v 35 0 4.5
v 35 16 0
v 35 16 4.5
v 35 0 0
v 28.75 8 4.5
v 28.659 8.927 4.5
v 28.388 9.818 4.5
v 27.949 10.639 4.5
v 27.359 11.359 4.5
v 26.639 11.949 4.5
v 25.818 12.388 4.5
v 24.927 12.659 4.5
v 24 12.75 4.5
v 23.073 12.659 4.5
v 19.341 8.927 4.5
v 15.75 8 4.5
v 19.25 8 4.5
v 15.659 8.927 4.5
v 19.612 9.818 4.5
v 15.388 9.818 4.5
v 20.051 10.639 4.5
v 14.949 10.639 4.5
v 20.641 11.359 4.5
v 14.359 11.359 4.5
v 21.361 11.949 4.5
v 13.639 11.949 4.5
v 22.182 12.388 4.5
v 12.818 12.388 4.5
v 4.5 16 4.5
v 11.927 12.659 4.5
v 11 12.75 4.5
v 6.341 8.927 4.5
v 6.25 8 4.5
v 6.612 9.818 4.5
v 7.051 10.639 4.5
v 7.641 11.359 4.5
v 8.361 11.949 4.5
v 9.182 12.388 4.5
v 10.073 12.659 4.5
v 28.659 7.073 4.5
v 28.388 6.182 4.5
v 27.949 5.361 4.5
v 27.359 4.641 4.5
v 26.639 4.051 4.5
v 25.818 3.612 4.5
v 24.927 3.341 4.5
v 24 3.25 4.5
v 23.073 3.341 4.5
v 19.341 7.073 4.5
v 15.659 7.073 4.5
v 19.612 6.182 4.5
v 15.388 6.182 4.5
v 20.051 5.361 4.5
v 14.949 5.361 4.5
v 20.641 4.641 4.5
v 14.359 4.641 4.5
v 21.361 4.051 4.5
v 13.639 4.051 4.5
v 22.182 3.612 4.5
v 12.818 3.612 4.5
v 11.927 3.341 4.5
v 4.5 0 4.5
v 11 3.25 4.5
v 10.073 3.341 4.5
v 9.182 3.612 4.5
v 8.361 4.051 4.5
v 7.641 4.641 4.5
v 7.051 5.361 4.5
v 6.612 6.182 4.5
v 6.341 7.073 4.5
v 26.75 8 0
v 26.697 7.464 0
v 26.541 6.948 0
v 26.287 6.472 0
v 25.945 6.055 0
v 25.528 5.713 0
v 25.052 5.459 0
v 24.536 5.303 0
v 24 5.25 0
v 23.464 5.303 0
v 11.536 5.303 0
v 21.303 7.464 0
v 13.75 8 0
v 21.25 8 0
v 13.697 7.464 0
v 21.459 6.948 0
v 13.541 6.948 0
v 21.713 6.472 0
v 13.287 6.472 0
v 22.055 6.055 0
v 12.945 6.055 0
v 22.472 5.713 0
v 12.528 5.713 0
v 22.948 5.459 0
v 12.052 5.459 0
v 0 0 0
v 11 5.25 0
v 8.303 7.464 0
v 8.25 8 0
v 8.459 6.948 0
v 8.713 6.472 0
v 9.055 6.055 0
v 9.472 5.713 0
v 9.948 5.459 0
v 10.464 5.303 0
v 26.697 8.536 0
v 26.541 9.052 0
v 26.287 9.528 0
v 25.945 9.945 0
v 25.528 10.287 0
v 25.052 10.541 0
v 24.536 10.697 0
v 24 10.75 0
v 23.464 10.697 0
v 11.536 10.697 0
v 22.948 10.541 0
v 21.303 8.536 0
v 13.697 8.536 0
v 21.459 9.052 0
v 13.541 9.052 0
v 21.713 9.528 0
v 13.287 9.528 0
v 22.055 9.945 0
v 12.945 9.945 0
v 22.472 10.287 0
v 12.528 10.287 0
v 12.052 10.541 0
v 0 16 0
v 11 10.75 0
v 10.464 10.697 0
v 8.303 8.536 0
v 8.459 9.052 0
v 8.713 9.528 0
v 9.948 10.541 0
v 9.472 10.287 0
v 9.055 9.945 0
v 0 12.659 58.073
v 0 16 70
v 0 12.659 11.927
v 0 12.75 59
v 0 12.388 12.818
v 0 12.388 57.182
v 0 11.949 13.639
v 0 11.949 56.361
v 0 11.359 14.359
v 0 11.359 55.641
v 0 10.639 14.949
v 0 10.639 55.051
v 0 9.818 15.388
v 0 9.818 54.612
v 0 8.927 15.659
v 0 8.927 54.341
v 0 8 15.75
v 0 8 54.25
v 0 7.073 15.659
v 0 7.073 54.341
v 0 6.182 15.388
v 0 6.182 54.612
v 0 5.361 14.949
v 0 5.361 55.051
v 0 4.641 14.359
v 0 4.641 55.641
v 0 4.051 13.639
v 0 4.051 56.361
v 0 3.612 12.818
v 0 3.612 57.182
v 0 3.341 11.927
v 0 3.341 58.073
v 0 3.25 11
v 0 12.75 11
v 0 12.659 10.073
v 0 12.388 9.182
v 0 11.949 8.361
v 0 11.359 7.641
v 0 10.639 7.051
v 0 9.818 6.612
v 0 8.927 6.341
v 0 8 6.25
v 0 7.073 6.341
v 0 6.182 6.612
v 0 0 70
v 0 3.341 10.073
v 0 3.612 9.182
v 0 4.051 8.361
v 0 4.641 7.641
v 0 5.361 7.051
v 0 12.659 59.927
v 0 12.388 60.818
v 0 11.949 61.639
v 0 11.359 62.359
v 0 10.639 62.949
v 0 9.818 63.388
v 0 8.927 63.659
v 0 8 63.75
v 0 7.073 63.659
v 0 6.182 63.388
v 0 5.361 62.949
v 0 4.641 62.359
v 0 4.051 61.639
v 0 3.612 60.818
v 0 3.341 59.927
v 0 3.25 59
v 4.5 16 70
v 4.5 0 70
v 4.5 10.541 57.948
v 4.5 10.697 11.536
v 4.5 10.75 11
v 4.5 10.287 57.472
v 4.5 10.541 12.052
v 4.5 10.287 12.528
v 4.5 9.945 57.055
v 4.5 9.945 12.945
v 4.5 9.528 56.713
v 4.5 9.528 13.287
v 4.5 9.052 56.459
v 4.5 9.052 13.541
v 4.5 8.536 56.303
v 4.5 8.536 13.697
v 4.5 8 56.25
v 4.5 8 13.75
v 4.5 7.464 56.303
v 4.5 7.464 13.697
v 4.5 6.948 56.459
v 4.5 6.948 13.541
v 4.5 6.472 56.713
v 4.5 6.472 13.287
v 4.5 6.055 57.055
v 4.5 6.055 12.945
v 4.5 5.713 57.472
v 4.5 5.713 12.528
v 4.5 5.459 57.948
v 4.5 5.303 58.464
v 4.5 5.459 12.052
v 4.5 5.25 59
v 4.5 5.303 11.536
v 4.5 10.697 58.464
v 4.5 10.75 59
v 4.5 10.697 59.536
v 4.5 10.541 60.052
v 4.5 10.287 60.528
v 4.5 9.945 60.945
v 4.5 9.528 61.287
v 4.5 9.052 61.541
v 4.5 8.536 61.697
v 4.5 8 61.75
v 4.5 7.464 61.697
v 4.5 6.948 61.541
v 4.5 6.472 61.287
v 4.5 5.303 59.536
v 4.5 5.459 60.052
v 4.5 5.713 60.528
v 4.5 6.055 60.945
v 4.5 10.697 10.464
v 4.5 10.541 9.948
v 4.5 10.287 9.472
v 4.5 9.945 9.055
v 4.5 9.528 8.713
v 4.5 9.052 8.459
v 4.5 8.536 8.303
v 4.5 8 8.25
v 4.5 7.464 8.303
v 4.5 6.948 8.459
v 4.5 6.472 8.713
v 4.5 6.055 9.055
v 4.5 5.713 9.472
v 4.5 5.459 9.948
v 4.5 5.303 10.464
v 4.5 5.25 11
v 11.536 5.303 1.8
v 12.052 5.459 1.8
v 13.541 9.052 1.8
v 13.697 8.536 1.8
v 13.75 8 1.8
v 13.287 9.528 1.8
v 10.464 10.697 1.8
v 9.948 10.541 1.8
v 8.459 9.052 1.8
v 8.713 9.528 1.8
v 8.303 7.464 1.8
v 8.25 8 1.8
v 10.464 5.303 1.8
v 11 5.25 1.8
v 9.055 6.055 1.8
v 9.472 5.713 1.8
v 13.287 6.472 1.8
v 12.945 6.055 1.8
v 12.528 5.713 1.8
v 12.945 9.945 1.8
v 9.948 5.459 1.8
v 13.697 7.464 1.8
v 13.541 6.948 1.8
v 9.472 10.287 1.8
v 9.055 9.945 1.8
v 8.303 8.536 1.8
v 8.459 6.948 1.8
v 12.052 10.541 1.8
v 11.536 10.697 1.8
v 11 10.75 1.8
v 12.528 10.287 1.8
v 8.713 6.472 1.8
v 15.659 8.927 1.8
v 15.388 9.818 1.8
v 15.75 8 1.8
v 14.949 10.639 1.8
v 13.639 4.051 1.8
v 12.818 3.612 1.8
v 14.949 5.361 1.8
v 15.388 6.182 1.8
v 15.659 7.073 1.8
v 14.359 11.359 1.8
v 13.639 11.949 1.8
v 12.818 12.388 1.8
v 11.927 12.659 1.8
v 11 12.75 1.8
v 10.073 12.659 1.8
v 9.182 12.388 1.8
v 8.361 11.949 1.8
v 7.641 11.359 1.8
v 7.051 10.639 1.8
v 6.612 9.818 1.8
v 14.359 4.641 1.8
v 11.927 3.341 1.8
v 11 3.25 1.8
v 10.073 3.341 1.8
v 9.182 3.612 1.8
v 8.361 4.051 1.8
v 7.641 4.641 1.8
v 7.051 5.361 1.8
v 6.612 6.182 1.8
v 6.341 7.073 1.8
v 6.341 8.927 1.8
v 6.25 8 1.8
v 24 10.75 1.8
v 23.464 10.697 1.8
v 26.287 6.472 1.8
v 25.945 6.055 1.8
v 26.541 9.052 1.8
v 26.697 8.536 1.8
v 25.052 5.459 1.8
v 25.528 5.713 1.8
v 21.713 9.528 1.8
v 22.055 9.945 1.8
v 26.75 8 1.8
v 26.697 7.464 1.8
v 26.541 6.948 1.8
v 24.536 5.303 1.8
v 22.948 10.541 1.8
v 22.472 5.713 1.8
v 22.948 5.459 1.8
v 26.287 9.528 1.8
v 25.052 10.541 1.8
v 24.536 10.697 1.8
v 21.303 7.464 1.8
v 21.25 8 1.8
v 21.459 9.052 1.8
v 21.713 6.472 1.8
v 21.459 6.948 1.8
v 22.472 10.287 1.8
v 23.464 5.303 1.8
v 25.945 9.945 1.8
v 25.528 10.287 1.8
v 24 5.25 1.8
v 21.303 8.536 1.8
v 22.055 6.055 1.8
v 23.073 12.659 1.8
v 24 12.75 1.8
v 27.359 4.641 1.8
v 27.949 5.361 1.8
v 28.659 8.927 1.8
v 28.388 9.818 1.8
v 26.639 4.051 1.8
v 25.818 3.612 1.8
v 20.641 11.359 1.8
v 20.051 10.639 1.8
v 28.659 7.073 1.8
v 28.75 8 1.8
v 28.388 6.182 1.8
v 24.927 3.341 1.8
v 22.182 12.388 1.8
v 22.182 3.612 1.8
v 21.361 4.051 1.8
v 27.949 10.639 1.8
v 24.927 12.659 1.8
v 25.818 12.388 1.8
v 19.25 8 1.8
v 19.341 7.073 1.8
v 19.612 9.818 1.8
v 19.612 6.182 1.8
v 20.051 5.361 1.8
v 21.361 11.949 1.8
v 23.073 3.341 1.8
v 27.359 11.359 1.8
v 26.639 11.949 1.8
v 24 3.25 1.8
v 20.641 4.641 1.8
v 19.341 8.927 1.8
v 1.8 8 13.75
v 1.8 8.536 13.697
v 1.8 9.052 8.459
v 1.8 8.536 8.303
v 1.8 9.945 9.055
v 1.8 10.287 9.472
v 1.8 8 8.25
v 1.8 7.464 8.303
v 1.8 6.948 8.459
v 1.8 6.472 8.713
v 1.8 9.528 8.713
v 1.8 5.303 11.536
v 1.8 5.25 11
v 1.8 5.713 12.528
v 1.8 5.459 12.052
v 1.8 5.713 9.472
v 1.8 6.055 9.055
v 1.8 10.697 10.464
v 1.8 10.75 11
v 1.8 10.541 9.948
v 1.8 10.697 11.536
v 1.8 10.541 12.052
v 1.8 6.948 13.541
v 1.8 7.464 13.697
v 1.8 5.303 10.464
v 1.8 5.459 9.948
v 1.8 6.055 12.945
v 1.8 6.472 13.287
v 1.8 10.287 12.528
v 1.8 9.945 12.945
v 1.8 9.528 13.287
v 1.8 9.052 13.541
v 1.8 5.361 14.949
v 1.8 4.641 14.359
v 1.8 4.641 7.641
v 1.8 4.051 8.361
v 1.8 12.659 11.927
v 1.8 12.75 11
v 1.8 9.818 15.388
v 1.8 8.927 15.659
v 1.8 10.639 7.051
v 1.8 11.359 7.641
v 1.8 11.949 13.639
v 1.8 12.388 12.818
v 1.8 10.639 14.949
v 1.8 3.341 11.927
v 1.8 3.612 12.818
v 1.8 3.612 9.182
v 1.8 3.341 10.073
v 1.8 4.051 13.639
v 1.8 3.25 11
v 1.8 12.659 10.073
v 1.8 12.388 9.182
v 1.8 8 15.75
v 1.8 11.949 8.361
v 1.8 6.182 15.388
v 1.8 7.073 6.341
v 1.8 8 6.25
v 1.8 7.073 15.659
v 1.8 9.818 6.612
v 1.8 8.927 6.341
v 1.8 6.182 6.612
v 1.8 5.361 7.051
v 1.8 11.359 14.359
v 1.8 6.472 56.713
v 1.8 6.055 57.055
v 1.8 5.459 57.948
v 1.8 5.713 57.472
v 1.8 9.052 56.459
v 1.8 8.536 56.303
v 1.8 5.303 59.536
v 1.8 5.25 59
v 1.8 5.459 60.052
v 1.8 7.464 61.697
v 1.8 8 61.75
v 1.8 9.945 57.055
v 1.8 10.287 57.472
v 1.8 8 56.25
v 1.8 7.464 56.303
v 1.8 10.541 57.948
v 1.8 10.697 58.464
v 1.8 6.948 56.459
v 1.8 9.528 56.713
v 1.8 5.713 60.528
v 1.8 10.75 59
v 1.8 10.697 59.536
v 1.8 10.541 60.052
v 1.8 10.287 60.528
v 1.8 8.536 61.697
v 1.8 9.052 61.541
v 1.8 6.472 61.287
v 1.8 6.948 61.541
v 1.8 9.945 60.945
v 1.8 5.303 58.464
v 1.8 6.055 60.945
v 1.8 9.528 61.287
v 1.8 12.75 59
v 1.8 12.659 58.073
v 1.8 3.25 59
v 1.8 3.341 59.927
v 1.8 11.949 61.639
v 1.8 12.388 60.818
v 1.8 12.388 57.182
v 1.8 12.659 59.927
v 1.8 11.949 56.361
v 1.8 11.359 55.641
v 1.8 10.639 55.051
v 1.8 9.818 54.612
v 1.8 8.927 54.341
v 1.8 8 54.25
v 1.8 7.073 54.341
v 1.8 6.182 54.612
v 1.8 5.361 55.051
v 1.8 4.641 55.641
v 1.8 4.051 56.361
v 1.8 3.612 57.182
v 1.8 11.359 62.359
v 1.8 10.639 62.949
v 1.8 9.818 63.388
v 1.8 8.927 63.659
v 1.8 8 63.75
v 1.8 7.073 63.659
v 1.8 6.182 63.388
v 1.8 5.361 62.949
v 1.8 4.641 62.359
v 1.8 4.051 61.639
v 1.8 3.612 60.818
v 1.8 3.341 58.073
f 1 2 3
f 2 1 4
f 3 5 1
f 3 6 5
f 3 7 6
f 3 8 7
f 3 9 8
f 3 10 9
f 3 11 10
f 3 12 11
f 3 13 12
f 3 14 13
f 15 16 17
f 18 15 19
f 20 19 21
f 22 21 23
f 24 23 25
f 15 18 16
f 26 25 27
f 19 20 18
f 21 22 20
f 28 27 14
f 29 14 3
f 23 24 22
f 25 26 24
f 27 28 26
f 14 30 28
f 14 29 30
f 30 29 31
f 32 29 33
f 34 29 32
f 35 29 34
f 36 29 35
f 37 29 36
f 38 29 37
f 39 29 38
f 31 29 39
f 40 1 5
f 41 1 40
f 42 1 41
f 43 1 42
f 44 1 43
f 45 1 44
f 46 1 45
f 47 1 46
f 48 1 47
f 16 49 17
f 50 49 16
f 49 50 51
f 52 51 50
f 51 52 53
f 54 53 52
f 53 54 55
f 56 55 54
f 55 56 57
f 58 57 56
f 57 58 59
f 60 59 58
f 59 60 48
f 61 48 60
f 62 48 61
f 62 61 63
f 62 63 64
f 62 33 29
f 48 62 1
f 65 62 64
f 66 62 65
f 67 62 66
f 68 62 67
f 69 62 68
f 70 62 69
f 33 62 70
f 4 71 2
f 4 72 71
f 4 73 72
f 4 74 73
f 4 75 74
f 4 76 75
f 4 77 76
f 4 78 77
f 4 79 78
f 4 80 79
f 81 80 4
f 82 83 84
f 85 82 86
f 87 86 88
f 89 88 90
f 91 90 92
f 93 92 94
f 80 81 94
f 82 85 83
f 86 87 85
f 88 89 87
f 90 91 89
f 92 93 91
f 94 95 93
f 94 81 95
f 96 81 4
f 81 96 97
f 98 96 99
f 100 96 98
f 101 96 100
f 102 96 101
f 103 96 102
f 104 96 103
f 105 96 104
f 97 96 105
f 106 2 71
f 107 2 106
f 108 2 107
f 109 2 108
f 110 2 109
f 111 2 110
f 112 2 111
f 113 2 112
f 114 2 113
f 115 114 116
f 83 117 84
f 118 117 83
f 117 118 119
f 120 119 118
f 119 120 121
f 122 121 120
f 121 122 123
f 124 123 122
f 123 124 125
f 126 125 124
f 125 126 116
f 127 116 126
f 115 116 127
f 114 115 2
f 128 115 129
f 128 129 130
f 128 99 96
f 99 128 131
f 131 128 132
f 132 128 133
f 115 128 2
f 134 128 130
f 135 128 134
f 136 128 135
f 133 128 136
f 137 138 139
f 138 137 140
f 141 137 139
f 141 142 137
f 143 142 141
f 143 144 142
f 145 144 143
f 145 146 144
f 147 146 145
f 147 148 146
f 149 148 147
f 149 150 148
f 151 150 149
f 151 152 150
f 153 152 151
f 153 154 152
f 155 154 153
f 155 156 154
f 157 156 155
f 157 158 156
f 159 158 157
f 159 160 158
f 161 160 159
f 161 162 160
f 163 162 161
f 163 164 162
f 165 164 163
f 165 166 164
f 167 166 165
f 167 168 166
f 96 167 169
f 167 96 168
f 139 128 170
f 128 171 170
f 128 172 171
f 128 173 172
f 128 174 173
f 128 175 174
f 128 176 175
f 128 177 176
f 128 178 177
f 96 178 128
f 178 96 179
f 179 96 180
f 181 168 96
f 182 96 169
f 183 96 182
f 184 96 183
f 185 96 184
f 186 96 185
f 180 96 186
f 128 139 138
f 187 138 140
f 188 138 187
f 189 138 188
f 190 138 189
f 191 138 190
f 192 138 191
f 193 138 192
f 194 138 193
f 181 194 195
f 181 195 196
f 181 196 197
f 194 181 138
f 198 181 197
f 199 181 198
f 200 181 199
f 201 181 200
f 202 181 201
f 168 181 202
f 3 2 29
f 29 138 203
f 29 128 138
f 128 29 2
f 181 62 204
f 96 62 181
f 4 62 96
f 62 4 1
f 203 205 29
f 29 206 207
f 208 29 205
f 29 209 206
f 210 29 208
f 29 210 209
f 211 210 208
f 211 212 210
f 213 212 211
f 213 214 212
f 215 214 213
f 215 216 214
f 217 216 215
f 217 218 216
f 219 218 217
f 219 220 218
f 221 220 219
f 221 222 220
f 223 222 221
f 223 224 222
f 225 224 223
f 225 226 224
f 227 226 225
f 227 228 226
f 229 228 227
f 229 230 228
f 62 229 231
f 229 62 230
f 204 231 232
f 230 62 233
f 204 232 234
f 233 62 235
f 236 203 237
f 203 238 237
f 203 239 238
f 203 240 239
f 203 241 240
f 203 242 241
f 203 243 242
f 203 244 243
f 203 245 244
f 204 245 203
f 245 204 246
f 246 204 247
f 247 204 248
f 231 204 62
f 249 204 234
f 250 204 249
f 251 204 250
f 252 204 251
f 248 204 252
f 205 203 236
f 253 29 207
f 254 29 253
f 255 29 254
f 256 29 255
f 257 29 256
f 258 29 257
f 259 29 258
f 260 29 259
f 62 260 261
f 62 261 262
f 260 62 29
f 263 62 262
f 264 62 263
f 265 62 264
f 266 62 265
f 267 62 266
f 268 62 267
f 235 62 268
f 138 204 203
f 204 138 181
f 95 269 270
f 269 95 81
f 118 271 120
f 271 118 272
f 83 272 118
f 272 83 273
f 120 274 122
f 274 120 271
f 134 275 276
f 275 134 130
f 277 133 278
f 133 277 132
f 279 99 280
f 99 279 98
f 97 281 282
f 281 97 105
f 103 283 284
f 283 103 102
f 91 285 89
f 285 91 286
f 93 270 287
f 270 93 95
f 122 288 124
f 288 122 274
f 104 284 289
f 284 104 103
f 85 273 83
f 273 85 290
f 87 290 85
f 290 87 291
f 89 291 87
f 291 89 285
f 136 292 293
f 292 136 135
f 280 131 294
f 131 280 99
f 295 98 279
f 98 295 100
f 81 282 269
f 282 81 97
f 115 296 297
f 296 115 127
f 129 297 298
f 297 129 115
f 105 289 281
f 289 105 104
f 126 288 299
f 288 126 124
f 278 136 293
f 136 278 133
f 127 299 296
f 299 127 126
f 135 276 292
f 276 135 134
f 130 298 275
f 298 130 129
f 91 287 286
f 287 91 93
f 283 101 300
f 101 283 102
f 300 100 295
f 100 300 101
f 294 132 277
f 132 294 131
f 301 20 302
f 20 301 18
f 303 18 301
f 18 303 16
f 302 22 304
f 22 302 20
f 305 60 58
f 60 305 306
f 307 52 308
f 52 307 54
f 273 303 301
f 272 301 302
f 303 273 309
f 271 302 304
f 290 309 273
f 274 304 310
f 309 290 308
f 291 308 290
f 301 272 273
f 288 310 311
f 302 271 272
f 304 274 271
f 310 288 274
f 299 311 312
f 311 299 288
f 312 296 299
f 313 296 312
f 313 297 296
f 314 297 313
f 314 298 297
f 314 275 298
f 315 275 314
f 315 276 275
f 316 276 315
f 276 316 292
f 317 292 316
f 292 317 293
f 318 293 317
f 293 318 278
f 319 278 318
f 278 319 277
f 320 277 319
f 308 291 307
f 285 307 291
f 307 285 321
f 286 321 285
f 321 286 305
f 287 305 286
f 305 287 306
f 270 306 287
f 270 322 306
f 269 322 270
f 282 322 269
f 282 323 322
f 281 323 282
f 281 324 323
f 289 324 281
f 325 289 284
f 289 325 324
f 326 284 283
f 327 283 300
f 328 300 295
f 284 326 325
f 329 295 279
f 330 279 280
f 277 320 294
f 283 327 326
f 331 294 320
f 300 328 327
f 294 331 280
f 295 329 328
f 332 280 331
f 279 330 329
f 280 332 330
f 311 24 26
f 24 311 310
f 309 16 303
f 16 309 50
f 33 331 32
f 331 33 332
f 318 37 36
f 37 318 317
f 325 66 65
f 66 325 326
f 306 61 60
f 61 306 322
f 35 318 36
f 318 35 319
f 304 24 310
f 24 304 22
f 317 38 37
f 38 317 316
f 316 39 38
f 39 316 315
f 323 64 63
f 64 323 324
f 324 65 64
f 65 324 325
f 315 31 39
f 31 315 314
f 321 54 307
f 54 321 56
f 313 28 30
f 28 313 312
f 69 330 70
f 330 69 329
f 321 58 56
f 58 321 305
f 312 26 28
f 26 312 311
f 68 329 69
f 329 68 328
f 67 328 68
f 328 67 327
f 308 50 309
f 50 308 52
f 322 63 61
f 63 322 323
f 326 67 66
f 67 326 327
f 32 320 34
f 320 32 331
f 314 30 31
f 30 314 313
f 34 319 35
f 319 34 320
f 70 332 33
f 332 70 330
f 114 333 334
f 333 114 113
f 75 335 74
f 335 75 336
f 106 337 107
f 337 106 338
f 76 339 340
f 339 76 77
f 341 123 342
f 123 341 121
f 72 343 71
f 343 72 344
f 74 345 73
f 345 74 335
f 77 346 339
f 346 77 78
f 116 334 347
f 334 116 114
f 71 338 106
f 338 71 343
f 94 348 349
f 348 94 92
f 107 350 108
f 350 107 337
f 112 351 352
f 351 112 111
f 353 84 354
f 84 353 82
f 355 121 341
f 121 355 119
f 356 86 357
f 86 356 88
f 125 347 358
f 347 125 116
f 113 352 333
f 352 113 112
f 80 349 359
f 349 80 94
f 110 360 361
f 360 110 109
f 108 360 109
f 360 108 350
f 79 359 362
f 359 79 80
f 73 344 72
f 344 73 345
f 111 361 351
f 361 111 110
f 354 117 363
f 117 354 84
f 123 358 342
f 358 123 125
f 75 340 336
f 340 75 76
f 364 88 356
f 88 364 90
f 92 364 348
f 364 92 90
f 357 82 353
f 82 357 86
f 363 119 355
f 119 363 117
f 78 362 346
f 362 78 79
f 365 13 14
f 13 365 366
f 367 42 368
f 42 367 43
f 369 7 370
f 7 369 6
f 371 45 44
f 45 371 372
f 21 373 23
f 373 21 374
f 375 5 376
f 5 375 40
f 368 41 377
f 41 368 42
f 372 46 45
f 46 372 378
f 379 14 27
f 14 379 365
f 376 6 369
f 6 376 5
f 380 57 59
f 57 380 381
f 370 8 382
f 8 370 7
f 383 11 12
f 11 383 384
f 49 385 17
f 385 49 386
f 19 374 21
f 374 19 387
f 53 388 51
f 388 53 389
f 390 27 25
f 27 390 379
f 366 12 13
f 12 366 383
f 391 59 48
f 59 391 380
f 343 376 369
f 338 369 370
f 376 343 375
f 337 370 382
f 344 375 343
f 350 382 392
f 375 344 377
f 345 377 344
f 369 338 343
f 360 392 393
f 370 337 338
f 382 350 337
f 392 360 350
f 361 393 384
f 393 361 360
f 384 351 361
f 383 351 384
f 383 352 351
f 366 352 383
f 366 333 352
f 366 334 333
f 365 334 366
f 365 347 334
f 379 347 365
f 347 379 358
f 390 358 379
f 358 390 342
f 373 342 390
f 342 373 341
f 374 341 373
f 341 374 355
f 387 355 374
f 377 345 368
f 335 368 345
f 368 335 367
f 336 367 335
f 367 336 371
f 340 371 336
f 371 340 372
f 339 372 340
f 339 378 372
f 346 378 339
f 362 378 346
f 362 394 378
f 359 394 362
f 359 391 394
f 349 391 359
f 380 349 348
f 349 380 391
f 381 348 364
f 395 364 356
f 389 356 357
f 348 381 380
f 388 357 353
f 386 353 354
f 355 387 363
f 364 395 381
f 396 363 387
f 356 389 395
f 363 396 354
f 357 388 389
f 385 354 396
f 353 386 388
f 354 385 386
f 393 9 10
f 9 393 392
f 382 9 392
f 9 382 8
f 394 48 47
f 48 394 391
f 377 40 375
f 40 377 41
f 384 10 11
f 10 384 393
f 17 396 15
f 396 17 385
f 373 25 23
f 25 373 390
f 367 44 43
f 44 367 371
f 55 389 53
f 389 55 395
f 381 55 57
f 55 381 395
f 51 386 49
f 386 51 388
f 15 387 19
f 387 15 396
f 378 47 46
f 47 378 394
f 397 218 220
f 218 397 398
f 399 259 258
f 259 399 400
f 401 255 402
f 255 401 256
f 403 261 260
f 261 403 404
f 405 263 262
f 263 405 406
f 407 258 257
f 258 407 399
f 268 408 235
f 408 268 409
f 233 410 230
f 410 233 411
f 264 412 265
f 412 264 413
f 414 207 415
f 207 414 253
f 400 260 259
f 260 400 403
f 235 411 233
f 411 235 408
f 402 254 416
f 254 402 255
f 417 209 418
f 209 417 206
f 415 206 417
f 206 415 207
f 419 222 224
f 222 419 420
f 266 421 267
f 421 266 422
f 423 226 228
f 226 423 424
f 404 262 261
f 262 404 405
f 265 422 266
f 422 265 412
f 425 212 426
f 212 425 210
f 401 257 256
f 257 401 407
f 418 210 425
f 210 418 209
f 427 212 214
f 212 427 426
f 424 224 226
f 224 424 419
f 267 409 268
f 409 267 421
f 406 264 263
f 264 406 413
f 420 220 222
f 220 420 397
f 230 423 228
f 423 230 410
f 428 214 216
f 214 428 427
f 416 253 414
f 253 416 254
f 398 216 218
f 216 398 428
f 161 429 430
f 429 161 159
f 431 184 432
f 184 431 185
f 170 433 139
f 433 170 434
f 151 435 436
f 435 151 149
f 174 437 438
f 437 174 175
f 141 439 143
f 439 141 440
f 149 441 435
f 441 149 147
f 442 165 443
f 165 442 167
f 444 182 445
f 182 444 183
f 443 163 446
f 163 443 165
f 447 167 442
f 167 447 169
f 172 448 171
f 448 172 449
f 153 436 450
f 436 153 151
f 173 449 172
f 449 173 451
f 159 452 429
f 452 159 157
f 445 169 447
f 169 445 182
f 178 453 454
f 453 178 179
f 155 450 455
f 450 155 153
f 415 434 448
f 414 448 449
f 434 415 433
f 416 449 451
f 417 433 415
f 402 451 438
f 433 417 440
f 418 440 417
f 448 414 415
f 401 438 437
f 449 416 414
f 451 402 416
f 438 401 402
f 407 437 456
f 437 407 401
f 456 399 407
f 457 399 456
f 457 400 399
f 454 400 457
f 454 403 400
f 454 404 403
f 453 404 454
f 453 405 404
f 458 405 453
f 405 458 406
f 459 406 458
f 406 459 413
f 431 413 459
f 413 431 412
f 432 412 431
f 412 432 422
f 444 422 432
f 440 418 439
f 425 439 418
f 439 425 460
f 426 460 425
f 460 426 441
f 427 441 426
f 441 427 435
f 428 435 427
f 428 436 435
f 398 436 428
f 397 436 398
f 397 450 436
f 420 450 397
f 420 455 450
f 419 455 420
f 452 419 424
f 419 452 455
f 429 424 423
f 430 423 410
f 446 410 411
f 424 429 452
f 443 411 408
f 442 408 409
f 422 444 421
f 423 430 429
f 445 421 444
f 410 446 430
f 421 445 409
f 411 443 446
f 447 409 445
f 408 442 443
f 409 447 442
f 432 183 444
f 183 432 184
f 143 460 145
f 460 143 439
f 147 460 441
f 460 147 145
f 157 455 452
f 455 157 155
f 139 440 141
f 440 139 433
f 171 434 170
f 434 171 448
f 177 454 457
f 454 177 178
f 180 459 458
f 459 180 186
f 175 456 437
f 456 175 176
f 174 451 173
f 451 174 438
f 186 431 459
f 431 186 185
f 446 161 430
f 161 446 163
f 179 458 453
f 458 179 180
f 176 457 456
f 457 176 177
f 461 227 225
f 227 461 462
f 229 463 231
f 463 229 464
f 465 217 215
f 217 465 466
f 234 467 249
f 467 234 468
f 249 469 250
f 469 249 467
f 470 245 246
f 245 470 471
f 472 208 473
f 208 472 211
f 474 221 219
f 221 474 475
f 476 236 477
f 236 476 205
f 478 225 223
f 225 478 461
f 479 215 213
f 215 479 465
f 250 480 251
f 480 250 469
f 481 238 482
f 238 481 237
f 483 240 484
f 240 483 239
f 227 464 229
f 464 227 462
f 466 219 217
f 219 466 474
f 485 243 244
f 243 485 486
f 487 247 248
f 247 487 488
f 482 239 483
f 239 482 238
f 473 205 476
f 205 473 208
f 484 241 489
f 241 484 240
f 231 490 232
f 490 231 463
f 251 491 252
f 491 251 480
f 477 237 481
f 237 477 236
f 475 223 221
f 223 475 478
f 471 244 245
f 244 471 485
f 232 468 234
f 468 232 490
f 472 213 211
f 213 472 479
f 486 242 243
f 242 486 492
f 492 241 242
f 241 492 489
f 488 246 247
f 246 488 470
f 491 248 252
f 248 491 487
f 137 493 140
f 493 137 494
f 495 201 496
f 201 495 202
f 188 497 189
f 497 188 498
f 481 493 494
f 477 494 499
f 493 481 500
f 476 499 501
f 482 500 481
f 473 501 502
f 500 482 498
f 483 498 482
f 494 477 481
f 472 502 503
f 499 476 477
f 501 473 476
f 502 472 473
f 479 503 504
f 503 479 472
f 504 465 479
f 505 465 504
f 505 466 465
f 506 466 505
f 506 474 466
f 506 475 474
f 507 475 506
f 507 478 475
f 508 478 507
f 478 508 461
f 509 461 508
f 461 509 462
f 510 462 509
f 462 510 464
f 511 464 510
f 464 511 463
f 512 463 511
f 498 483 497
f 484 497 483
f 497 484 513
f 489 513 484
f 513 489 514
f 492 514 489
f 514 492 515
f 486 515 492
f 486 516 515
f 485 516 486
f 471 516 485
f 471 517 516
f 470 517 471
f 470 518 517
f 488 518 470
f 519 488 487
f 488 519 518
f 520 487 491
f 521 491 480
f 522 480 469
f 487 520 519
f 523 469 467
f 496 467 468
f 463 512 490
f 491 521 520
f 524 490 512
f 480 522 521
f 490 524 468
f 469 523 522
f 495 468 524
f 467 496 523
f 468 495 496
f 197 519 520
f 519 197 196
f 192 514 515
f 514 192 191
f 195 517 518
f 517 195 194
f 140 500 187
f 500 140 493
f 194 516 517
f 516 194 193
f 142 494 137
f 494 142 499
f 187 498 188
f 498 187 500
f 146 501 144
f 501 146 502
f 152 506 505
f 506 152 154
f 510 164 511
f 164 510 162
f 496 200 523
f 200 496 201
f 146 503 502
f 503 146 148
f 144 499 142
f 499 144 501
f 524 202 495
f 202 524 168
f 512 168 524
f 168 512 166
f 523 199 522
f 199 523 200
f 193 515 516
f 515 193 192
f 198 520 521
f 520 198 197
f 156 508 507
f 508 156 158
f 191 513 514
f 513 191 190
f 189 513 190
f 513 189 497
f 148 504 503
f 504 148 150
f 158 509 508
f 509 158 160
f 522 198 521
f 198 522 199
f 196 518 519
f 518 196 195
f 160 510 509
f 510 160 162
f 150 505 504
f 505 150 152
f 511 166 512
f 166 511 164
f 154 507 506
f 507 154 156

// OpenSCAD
$fn = 32;

// ----------------------------------------------------------------------
// L-bracket: 35 x 16 x 70 mm
// ----------------------------------------------------------------------

// --- parameters (mm) ---
leg_a = 35;               // horizontal leg, X
leg_b = 70;               // vertical leg, Z
depth = 16;               // bracket depth, Y
thick = 4.5;              // plate thickness
hole_d = 5.5;             // clearance for M5
cb_d = 9.5;               // counterbore seat
cb_h = 2.7;               // counterbore depth

module hole_z(px, py) {
  translate([px, py, -2.5]) cylinder(h = thick + 5, d = hole_d);
}
module hole_x(pz, py) {
  translate([-2.5, py, pz]) rotate([0, 90, 0]) cylinder(h = thick + 5, d = hole_d);
}
module cb_z(px, py) {
  translate([px, py, thick - cb_h]) cylinder(h = cb_h + 0.4, d = cb_d);
}
module cb_x(pz, py) {
  translate([thick - cb_h, py, pz]) rotate([0, -90, 0]) cylinder(h = cb_h + 0.4, d = cb_d);
}

difference() {
  union() {
    /* horizontal leg */
    cube([leg_a, depth, thick]);
    /* vertical leg, overlapping the corner block */
    cube([thick, depth, leg_b]);
  }
  hole_z(11, 8);
  cb_z(11, 8);
  hole_z(24, 8);
  cb_z(24, 8);
  hole_x(11, 8);
  cb_x(11, 8);
  hole_x(59, 8);
  cb_x(59, 8);
}
